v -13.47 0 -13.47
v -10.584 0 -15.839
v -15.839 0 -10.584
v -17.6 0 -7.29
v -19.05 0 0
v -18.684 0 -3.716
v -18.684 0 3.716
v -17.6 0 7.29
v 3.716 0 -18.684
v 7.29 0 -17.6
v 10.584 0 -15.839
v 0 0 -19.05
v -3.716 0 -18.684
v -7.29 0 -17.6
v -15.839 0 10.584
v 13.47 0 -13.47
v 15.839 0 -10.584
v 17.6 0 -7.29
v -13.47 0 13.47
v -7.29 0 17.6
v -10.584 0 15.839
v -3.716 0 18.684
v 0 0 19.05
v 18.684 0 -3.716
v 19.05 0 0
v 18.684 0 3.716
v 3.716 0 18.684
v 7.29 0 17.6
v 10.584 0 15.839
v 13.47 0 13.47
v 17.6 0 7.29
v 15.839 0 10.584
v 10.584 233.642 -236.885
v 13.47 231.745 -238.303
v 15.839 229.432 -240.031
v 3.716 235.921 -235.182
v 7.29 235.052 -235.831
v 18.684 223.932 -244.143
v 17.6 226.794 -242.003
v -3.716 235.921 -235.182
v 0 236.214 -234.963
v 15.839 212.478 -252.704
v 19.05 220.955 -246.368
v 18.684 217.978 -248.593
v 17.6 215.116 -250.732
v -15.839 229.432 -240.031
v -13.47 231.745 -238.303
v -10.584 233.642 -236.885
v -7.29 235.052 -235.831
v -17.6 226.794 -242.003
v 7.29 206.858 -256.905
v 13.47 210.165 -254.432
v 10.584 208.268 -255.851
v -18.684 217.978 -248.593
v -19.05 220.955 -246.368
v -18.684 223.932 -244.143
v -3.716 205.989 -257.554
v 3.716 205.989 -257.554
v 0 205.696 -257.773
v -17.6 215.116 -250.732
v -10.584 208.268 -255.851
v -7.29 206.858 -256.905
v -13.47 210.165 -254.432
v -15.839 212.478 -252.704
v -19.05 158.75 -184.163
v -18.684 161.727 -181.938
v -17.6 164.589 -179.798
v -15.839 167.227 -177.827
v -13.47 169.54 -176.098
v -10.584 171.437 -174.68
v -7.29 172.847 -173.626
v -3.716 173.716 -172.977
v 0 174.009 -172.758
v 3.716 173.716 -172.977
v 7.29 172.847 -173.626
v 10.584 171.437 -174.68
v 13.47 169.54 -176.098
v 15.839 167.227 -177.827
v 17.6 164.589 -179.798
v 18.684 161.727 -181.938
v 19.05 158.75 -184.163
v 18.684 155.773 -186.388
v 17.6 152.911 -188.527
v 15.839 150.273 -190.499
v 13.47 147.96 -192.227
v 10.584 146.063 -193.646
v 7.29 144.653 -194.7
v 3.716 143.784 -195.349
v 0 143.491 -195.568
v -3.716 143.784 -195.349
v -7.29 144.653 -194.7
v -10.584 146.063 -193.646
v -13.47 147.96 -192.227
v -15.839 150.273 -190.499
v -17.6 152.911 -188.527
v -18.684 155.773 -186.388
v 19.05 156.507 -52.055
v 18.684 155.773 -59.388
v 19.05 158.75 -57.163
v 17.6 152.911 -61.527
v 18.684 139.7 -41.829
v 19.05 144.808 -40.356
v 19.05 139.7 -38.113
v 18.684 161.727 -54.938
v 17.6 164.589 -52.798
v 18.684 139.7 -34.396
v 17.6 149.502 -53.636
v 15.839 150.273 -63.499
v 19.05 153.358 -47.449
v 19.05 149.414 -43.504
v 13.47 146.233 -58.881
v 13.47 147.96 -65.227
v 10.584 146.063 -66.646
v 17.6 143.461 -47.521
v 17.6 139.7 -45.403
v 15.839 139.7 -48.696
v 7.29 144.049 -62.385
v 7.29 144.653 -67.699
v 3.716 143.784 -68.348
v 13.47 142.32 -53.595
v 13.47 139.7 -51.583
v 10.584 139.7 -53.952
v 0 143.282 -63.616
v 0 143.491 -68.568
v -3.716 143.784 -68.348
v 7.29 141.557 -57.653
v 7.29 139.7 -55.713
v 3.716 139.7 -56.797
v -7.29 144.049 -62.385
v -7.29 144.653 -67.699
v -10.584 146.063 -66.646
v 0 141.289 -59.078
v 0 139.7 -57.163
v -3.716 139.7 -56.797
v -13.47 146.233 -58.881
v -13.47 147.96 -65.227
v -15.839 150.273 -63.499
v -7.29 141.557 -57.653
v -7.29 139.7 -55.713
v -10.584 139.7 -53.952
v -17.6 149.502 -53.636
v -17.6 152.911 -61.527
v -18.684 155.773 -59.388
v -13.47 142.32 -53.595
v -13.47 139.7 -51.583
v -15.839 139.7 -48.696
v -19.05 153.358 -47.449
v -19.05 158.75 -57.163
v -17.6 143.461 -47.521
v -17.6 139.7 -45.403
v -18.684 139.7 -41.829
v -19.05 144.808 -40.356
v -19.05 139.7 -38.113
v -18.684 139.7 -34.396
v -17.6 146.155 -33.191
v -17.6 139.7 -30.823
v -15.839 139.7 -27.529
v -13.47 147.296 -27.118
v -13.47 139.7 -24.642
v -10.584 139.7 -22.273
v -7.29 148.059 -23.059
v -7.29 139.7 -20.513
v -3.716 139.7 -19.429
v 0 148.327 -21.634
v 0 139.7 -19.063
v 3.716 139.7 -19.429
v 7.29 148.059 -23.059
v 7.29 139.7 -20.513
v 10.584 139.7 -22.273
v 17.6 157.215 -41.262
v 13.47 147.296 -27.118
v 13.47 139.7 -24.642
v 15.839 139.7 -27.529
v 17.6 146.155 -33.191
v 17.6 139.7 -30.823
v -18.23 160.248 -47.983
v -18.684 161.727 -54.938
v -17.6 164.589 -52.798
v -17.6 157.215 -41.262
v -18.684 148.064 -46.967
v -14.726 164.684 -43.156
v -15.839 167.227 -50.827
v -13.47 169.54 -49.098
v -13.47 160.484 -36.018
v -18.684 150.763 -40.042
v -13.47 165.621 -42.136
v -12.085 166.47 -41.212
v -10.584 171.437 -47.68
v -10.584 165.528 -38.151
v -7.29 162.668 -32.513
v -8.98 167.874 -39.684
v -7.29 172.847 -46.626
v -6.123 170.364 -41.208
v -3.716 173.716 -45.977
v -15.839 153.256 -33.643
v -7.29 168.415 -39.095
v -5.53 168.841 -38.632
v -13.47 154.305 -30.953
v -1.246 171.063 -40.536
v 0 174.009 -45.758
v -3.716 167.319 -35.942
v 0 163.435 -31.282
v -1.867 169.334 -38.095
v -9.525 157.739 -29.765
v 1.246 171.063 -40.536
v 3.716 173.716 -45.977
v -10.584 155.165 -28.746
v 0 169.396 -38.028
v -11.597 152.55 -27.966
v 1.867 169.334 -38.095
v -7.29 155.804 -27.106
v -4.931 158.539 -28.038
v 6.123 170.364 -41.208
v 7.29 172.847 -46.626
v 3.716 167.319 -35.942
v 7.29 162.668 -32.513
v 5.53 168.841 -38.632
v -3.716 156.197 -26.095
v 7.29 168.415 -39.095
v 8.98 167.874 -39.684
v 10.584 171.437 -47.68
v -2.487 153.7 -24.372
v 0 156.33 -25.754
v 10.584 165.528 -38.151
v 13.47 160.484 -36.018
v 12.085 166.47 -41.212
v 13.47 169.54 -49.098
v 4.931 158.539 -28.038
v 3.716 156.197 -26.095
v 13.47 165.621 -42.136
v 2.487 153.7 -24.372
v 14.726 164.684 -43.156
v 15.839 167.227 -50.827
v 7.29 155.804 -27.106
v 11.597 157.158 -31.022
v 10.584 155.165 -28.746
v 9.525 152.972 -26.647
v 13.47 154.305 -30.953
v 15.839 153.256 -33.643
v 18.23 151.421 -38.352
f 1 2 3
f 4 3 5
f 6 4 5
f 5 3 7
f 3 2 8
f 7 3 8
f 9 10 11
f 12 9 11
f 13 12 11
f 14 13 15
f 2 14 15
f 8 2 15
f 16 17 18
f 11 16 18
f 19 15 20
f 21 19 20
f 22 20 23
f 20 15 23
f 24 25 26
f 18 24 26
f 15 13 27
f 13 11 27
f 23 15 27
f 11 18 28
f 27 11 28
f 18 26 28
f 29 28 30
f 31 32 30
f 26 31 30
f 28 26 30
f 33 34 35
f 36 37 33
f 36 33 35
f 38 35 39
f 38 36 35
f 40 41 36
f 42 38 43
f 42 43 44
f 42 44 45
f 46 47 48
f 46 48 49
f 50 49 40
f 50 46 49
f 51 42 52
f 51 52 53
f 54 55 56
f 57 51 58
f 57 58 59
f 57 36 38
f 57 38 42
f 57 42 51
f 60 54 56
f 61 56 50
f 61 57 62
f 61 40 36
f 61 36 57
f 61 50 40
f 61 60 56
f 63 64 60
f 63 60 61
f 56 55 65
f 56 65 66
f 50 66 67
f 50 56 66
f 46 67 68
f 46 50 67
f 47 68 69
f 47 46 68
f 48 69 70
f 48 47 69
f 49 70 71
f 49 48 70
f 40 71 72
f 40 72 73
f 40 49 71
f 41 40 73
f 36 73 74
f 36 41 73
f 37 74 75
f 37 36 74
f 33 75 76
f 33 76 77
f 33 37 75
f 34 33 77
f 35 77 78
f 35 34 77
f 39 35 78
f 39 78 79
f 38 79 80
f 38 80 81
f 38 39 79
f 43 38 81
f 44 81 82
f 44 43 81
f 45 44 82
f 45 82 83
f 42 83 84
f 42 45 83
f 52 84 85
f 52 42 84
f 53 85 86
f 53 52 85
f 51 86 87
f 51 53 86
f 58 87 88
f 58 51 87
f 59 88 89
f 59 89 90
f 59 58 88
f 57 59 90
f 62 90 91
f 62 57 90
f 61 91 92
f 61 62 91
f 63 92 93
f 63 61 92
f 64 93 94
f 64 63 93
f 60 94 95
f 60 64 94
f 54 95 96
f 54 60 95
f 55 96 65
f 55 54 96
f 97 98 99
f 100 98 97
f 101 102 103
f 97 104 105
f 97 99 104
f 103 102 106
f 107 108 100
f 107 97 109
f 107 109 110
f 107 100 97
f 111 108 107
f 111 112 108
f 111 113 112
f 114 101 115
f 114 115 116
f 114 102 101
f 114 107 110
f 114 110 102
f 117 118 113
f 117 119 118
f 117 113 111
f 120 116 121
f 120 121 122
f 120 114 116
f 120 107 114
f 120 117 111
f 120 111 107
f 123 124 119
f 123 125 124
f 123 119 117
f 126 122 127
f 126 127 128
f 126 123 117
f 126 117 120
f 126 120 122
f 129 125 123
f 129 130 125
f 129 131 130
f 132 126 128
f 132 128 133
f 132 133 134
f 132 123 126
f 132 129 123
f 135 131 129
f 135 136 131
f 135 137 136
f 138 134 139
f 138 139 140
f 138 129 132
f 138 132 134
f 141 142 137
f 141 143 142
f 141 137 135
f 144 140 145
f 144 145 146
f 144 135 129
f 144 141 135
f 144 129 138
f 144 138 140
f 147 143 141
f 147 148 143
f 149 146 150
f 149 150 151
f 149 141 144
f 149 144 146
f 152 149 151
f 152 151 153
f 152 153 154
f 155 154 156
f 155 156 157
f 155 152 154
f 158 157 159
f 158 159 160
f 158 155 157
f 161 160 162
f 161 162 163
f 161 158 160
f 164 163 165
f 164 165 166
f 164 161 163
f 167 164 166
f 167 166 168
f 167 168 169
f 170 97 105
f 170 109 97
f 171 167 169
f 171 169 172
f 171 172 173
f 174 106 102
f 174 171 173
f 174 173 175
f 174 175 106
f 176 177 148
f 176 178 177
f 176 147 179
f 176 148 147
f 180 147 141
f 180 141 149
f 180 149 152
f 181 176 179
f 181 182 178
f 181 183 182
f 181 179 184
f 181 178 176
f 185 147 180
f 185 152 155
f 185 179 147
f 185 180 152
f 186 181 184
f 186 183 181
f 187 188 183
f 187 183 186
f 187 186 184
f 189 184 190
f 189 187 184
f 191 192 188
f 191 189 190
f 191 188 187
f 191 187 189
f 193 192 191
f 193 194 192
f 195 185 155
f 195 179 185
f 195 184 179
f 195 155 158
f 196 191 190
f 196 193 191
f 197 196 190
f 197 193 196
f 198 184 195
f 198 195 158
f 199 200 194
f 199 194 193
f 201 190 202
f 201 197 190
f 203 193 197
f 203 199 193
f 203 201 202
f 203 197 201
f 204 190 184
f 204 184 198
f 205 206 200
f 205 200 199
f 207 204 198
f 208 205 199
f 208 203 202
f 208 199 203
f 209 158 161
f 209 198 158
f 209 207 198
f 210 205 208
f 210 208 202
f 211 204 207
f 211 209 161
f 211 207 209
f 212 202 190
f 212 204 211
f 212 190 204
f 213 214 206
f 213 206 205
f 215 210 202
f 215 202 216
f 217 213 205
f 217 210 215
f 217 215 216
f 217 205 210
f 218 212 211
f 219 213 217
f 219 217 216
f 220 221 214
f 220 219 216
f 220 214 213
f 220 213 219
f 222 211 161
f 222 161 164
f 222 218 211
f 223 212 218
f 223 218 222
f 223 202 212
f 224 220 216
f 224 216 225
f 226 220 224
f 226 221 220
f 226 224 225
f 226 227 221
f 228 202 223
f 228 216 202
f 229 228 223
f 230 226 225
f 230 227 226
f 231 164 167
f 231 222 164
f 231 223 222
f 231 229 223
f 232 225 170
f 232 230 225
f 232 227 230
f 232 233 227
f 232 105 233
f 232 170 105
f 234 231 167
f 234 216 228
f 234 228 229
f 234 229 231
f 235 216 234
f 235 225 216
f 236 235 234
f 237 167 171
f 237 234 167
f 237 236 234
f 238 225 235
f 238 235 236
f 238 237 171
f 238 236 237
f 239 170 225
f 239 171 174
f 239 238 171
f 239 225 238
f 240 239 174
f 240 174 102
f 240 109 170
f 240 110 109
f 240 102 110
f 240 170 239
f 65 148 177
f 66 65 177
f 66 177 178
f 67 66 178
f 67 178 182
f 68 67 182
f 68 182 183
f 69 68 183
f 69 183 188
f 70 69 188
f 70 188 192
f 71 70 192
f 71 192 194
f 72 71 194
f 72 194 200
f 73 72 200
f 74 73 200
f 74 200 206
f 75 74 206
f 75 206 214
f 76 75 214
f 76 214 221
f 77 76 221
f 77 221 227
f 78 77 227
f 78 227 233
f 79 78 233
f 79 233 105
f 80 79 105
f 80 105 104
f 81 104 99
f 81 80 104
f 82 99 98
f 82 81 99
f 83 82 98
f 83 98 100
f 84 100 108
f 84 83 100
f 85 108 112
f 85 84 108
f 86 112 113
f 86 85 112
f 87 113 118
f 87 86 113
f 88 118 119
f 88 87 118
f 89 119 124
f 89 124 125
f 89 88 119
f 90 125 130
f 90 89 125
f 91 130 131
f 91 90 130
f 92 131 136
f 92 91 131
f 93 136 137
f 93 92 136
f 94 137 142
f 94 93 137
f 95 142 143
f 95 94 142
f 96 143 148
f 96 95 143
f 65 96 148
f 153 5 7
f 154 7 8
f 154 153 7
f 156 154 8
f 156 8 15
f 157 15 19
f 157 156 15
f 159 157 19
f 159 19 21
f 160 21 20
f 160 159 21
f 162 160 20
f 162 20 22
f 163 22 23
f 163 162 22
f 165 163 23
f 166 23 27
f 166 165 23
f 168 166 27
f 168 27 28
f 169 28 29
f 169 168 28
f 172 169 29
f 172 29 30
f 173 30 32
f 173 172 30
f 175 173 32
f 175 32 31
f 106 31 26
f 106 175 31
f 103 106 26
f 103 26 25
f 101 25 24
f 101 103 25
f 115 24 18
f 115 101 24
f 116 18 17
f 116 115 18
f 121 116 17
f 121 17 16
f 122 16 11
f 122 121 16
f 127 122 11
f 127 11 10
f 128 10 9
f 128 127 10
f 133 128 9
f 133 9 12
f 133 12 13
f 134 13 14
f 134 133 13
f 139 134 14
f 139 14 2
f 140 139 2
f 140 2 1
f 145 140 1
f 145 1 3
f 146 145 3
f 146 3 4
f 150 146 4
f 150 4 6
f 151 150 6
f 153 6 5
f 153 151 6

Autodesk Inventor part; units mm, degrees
ref_plane "YZ Plane" through (0, 0, 0) normal (1, 0, 0) x (0, 1, 0)
ref_plane "XZ Plane" through (0, 0, 0) normal (0, 1, 0) x (-1, 0, 0)
ref_plane "XY Plane" through (0, 0, 0) normal (0, 0, 1) x (1, 0, 0)
sketch "Sketch1" plane through (0, 0, 0) normal (0, 1, 0) x (-1, 0, 0)
  circle A0 centre (0, 0) radius 19.05
  dimension "d0" = 38.1
sketch "Sketch2" plane through (0, 0, 0) normal (1, 0, 0) x (0, 1, 0)
  line L0 (0, 0) -> (139.7, -38.1128)
  line L1 (0, 0) -> (144.8056, 0) construction
  dimension "d4" = 15.26
sweep "Sweep1" add profiles "Sketch1" path "Sketch2"
sketch "Sketch3" plane through (0, 139.7, -38.1128) normal (0, 1, 0) x (1, 0, 0)
  circle A0 centre (0, 0) radius 19.05
  point P0 (0, -38.1128)
sketch "Sketch4" plane through (0, 0, 0) normal (1, 0, 0) x (0, 1, 0)
  line L0 (139.7, -57.1628) -> (139.7, -19.0628) projected
  arc A0 (158.75, -57.1628) -> (139.7, -38.1128) centre (130.214, -66.6487) ccw
  line L1 (158.75, -184.1628) -> (260.35, -184.1628) construction
  point P0 (0, 0)
sweep "Sweep2" add profiles "Sketch3" path "Sketch4" path curves A0
sketch "Sketch5" plane through (0, 158.75, -57.1628) normal (0, 0.5986852, -0.8009844) x (-1, 0, 0)
  circle A0 centre (0, 0) radius 19.05
  point P0 (0, -92.9338)
sketch "Sketch6" plane through (0, 0, 0) normal (1, 0, 0) x (0, 1, 0)
  line L0 (158.75, -57.1628) -> (158.75, -184.1628)
  point P0 (0, 0)
  dimension "d16" = 127
sweep "Sweep3" add profiles "Sketch5" path "Sketch6"
sketch "Sketch7" plane through (0, 158.75, -184.1628) normal (0, 0.5986852, -0.8009844) x (-1, 0, 0)
  circle A0 centre (0, 0) radius 19.05
  point P0 (0, -16.9007)
sketch "Sketch8" plane through (0, 0, 0) normal (1, 0, 0) x (0, 1, 0)
  line L0 (143.4912, -195.5677) -> (174.0088, -172.7578) projected
  line L1 (158.75, -184.1628) -> (220.955, -246.3677)
  line L2 (158.75, -184.1628) -> (246.7211, -184.1628) construction
  point P0 (0, 0)
  dimension "d20" = 45
sweep "Sweep4" add profiles "Sketch7" path "Sketch8" path curves L1
sketch "Sketch13" plane through (0, 0, 0) normal (1, 0, 0) x (0, 1, 0)
  line L0 (205.6962, -257.7727) -> (236.2137, -234.9628) projected
  point P0 (0, 0)
properties part number "rocker (1.1)"
